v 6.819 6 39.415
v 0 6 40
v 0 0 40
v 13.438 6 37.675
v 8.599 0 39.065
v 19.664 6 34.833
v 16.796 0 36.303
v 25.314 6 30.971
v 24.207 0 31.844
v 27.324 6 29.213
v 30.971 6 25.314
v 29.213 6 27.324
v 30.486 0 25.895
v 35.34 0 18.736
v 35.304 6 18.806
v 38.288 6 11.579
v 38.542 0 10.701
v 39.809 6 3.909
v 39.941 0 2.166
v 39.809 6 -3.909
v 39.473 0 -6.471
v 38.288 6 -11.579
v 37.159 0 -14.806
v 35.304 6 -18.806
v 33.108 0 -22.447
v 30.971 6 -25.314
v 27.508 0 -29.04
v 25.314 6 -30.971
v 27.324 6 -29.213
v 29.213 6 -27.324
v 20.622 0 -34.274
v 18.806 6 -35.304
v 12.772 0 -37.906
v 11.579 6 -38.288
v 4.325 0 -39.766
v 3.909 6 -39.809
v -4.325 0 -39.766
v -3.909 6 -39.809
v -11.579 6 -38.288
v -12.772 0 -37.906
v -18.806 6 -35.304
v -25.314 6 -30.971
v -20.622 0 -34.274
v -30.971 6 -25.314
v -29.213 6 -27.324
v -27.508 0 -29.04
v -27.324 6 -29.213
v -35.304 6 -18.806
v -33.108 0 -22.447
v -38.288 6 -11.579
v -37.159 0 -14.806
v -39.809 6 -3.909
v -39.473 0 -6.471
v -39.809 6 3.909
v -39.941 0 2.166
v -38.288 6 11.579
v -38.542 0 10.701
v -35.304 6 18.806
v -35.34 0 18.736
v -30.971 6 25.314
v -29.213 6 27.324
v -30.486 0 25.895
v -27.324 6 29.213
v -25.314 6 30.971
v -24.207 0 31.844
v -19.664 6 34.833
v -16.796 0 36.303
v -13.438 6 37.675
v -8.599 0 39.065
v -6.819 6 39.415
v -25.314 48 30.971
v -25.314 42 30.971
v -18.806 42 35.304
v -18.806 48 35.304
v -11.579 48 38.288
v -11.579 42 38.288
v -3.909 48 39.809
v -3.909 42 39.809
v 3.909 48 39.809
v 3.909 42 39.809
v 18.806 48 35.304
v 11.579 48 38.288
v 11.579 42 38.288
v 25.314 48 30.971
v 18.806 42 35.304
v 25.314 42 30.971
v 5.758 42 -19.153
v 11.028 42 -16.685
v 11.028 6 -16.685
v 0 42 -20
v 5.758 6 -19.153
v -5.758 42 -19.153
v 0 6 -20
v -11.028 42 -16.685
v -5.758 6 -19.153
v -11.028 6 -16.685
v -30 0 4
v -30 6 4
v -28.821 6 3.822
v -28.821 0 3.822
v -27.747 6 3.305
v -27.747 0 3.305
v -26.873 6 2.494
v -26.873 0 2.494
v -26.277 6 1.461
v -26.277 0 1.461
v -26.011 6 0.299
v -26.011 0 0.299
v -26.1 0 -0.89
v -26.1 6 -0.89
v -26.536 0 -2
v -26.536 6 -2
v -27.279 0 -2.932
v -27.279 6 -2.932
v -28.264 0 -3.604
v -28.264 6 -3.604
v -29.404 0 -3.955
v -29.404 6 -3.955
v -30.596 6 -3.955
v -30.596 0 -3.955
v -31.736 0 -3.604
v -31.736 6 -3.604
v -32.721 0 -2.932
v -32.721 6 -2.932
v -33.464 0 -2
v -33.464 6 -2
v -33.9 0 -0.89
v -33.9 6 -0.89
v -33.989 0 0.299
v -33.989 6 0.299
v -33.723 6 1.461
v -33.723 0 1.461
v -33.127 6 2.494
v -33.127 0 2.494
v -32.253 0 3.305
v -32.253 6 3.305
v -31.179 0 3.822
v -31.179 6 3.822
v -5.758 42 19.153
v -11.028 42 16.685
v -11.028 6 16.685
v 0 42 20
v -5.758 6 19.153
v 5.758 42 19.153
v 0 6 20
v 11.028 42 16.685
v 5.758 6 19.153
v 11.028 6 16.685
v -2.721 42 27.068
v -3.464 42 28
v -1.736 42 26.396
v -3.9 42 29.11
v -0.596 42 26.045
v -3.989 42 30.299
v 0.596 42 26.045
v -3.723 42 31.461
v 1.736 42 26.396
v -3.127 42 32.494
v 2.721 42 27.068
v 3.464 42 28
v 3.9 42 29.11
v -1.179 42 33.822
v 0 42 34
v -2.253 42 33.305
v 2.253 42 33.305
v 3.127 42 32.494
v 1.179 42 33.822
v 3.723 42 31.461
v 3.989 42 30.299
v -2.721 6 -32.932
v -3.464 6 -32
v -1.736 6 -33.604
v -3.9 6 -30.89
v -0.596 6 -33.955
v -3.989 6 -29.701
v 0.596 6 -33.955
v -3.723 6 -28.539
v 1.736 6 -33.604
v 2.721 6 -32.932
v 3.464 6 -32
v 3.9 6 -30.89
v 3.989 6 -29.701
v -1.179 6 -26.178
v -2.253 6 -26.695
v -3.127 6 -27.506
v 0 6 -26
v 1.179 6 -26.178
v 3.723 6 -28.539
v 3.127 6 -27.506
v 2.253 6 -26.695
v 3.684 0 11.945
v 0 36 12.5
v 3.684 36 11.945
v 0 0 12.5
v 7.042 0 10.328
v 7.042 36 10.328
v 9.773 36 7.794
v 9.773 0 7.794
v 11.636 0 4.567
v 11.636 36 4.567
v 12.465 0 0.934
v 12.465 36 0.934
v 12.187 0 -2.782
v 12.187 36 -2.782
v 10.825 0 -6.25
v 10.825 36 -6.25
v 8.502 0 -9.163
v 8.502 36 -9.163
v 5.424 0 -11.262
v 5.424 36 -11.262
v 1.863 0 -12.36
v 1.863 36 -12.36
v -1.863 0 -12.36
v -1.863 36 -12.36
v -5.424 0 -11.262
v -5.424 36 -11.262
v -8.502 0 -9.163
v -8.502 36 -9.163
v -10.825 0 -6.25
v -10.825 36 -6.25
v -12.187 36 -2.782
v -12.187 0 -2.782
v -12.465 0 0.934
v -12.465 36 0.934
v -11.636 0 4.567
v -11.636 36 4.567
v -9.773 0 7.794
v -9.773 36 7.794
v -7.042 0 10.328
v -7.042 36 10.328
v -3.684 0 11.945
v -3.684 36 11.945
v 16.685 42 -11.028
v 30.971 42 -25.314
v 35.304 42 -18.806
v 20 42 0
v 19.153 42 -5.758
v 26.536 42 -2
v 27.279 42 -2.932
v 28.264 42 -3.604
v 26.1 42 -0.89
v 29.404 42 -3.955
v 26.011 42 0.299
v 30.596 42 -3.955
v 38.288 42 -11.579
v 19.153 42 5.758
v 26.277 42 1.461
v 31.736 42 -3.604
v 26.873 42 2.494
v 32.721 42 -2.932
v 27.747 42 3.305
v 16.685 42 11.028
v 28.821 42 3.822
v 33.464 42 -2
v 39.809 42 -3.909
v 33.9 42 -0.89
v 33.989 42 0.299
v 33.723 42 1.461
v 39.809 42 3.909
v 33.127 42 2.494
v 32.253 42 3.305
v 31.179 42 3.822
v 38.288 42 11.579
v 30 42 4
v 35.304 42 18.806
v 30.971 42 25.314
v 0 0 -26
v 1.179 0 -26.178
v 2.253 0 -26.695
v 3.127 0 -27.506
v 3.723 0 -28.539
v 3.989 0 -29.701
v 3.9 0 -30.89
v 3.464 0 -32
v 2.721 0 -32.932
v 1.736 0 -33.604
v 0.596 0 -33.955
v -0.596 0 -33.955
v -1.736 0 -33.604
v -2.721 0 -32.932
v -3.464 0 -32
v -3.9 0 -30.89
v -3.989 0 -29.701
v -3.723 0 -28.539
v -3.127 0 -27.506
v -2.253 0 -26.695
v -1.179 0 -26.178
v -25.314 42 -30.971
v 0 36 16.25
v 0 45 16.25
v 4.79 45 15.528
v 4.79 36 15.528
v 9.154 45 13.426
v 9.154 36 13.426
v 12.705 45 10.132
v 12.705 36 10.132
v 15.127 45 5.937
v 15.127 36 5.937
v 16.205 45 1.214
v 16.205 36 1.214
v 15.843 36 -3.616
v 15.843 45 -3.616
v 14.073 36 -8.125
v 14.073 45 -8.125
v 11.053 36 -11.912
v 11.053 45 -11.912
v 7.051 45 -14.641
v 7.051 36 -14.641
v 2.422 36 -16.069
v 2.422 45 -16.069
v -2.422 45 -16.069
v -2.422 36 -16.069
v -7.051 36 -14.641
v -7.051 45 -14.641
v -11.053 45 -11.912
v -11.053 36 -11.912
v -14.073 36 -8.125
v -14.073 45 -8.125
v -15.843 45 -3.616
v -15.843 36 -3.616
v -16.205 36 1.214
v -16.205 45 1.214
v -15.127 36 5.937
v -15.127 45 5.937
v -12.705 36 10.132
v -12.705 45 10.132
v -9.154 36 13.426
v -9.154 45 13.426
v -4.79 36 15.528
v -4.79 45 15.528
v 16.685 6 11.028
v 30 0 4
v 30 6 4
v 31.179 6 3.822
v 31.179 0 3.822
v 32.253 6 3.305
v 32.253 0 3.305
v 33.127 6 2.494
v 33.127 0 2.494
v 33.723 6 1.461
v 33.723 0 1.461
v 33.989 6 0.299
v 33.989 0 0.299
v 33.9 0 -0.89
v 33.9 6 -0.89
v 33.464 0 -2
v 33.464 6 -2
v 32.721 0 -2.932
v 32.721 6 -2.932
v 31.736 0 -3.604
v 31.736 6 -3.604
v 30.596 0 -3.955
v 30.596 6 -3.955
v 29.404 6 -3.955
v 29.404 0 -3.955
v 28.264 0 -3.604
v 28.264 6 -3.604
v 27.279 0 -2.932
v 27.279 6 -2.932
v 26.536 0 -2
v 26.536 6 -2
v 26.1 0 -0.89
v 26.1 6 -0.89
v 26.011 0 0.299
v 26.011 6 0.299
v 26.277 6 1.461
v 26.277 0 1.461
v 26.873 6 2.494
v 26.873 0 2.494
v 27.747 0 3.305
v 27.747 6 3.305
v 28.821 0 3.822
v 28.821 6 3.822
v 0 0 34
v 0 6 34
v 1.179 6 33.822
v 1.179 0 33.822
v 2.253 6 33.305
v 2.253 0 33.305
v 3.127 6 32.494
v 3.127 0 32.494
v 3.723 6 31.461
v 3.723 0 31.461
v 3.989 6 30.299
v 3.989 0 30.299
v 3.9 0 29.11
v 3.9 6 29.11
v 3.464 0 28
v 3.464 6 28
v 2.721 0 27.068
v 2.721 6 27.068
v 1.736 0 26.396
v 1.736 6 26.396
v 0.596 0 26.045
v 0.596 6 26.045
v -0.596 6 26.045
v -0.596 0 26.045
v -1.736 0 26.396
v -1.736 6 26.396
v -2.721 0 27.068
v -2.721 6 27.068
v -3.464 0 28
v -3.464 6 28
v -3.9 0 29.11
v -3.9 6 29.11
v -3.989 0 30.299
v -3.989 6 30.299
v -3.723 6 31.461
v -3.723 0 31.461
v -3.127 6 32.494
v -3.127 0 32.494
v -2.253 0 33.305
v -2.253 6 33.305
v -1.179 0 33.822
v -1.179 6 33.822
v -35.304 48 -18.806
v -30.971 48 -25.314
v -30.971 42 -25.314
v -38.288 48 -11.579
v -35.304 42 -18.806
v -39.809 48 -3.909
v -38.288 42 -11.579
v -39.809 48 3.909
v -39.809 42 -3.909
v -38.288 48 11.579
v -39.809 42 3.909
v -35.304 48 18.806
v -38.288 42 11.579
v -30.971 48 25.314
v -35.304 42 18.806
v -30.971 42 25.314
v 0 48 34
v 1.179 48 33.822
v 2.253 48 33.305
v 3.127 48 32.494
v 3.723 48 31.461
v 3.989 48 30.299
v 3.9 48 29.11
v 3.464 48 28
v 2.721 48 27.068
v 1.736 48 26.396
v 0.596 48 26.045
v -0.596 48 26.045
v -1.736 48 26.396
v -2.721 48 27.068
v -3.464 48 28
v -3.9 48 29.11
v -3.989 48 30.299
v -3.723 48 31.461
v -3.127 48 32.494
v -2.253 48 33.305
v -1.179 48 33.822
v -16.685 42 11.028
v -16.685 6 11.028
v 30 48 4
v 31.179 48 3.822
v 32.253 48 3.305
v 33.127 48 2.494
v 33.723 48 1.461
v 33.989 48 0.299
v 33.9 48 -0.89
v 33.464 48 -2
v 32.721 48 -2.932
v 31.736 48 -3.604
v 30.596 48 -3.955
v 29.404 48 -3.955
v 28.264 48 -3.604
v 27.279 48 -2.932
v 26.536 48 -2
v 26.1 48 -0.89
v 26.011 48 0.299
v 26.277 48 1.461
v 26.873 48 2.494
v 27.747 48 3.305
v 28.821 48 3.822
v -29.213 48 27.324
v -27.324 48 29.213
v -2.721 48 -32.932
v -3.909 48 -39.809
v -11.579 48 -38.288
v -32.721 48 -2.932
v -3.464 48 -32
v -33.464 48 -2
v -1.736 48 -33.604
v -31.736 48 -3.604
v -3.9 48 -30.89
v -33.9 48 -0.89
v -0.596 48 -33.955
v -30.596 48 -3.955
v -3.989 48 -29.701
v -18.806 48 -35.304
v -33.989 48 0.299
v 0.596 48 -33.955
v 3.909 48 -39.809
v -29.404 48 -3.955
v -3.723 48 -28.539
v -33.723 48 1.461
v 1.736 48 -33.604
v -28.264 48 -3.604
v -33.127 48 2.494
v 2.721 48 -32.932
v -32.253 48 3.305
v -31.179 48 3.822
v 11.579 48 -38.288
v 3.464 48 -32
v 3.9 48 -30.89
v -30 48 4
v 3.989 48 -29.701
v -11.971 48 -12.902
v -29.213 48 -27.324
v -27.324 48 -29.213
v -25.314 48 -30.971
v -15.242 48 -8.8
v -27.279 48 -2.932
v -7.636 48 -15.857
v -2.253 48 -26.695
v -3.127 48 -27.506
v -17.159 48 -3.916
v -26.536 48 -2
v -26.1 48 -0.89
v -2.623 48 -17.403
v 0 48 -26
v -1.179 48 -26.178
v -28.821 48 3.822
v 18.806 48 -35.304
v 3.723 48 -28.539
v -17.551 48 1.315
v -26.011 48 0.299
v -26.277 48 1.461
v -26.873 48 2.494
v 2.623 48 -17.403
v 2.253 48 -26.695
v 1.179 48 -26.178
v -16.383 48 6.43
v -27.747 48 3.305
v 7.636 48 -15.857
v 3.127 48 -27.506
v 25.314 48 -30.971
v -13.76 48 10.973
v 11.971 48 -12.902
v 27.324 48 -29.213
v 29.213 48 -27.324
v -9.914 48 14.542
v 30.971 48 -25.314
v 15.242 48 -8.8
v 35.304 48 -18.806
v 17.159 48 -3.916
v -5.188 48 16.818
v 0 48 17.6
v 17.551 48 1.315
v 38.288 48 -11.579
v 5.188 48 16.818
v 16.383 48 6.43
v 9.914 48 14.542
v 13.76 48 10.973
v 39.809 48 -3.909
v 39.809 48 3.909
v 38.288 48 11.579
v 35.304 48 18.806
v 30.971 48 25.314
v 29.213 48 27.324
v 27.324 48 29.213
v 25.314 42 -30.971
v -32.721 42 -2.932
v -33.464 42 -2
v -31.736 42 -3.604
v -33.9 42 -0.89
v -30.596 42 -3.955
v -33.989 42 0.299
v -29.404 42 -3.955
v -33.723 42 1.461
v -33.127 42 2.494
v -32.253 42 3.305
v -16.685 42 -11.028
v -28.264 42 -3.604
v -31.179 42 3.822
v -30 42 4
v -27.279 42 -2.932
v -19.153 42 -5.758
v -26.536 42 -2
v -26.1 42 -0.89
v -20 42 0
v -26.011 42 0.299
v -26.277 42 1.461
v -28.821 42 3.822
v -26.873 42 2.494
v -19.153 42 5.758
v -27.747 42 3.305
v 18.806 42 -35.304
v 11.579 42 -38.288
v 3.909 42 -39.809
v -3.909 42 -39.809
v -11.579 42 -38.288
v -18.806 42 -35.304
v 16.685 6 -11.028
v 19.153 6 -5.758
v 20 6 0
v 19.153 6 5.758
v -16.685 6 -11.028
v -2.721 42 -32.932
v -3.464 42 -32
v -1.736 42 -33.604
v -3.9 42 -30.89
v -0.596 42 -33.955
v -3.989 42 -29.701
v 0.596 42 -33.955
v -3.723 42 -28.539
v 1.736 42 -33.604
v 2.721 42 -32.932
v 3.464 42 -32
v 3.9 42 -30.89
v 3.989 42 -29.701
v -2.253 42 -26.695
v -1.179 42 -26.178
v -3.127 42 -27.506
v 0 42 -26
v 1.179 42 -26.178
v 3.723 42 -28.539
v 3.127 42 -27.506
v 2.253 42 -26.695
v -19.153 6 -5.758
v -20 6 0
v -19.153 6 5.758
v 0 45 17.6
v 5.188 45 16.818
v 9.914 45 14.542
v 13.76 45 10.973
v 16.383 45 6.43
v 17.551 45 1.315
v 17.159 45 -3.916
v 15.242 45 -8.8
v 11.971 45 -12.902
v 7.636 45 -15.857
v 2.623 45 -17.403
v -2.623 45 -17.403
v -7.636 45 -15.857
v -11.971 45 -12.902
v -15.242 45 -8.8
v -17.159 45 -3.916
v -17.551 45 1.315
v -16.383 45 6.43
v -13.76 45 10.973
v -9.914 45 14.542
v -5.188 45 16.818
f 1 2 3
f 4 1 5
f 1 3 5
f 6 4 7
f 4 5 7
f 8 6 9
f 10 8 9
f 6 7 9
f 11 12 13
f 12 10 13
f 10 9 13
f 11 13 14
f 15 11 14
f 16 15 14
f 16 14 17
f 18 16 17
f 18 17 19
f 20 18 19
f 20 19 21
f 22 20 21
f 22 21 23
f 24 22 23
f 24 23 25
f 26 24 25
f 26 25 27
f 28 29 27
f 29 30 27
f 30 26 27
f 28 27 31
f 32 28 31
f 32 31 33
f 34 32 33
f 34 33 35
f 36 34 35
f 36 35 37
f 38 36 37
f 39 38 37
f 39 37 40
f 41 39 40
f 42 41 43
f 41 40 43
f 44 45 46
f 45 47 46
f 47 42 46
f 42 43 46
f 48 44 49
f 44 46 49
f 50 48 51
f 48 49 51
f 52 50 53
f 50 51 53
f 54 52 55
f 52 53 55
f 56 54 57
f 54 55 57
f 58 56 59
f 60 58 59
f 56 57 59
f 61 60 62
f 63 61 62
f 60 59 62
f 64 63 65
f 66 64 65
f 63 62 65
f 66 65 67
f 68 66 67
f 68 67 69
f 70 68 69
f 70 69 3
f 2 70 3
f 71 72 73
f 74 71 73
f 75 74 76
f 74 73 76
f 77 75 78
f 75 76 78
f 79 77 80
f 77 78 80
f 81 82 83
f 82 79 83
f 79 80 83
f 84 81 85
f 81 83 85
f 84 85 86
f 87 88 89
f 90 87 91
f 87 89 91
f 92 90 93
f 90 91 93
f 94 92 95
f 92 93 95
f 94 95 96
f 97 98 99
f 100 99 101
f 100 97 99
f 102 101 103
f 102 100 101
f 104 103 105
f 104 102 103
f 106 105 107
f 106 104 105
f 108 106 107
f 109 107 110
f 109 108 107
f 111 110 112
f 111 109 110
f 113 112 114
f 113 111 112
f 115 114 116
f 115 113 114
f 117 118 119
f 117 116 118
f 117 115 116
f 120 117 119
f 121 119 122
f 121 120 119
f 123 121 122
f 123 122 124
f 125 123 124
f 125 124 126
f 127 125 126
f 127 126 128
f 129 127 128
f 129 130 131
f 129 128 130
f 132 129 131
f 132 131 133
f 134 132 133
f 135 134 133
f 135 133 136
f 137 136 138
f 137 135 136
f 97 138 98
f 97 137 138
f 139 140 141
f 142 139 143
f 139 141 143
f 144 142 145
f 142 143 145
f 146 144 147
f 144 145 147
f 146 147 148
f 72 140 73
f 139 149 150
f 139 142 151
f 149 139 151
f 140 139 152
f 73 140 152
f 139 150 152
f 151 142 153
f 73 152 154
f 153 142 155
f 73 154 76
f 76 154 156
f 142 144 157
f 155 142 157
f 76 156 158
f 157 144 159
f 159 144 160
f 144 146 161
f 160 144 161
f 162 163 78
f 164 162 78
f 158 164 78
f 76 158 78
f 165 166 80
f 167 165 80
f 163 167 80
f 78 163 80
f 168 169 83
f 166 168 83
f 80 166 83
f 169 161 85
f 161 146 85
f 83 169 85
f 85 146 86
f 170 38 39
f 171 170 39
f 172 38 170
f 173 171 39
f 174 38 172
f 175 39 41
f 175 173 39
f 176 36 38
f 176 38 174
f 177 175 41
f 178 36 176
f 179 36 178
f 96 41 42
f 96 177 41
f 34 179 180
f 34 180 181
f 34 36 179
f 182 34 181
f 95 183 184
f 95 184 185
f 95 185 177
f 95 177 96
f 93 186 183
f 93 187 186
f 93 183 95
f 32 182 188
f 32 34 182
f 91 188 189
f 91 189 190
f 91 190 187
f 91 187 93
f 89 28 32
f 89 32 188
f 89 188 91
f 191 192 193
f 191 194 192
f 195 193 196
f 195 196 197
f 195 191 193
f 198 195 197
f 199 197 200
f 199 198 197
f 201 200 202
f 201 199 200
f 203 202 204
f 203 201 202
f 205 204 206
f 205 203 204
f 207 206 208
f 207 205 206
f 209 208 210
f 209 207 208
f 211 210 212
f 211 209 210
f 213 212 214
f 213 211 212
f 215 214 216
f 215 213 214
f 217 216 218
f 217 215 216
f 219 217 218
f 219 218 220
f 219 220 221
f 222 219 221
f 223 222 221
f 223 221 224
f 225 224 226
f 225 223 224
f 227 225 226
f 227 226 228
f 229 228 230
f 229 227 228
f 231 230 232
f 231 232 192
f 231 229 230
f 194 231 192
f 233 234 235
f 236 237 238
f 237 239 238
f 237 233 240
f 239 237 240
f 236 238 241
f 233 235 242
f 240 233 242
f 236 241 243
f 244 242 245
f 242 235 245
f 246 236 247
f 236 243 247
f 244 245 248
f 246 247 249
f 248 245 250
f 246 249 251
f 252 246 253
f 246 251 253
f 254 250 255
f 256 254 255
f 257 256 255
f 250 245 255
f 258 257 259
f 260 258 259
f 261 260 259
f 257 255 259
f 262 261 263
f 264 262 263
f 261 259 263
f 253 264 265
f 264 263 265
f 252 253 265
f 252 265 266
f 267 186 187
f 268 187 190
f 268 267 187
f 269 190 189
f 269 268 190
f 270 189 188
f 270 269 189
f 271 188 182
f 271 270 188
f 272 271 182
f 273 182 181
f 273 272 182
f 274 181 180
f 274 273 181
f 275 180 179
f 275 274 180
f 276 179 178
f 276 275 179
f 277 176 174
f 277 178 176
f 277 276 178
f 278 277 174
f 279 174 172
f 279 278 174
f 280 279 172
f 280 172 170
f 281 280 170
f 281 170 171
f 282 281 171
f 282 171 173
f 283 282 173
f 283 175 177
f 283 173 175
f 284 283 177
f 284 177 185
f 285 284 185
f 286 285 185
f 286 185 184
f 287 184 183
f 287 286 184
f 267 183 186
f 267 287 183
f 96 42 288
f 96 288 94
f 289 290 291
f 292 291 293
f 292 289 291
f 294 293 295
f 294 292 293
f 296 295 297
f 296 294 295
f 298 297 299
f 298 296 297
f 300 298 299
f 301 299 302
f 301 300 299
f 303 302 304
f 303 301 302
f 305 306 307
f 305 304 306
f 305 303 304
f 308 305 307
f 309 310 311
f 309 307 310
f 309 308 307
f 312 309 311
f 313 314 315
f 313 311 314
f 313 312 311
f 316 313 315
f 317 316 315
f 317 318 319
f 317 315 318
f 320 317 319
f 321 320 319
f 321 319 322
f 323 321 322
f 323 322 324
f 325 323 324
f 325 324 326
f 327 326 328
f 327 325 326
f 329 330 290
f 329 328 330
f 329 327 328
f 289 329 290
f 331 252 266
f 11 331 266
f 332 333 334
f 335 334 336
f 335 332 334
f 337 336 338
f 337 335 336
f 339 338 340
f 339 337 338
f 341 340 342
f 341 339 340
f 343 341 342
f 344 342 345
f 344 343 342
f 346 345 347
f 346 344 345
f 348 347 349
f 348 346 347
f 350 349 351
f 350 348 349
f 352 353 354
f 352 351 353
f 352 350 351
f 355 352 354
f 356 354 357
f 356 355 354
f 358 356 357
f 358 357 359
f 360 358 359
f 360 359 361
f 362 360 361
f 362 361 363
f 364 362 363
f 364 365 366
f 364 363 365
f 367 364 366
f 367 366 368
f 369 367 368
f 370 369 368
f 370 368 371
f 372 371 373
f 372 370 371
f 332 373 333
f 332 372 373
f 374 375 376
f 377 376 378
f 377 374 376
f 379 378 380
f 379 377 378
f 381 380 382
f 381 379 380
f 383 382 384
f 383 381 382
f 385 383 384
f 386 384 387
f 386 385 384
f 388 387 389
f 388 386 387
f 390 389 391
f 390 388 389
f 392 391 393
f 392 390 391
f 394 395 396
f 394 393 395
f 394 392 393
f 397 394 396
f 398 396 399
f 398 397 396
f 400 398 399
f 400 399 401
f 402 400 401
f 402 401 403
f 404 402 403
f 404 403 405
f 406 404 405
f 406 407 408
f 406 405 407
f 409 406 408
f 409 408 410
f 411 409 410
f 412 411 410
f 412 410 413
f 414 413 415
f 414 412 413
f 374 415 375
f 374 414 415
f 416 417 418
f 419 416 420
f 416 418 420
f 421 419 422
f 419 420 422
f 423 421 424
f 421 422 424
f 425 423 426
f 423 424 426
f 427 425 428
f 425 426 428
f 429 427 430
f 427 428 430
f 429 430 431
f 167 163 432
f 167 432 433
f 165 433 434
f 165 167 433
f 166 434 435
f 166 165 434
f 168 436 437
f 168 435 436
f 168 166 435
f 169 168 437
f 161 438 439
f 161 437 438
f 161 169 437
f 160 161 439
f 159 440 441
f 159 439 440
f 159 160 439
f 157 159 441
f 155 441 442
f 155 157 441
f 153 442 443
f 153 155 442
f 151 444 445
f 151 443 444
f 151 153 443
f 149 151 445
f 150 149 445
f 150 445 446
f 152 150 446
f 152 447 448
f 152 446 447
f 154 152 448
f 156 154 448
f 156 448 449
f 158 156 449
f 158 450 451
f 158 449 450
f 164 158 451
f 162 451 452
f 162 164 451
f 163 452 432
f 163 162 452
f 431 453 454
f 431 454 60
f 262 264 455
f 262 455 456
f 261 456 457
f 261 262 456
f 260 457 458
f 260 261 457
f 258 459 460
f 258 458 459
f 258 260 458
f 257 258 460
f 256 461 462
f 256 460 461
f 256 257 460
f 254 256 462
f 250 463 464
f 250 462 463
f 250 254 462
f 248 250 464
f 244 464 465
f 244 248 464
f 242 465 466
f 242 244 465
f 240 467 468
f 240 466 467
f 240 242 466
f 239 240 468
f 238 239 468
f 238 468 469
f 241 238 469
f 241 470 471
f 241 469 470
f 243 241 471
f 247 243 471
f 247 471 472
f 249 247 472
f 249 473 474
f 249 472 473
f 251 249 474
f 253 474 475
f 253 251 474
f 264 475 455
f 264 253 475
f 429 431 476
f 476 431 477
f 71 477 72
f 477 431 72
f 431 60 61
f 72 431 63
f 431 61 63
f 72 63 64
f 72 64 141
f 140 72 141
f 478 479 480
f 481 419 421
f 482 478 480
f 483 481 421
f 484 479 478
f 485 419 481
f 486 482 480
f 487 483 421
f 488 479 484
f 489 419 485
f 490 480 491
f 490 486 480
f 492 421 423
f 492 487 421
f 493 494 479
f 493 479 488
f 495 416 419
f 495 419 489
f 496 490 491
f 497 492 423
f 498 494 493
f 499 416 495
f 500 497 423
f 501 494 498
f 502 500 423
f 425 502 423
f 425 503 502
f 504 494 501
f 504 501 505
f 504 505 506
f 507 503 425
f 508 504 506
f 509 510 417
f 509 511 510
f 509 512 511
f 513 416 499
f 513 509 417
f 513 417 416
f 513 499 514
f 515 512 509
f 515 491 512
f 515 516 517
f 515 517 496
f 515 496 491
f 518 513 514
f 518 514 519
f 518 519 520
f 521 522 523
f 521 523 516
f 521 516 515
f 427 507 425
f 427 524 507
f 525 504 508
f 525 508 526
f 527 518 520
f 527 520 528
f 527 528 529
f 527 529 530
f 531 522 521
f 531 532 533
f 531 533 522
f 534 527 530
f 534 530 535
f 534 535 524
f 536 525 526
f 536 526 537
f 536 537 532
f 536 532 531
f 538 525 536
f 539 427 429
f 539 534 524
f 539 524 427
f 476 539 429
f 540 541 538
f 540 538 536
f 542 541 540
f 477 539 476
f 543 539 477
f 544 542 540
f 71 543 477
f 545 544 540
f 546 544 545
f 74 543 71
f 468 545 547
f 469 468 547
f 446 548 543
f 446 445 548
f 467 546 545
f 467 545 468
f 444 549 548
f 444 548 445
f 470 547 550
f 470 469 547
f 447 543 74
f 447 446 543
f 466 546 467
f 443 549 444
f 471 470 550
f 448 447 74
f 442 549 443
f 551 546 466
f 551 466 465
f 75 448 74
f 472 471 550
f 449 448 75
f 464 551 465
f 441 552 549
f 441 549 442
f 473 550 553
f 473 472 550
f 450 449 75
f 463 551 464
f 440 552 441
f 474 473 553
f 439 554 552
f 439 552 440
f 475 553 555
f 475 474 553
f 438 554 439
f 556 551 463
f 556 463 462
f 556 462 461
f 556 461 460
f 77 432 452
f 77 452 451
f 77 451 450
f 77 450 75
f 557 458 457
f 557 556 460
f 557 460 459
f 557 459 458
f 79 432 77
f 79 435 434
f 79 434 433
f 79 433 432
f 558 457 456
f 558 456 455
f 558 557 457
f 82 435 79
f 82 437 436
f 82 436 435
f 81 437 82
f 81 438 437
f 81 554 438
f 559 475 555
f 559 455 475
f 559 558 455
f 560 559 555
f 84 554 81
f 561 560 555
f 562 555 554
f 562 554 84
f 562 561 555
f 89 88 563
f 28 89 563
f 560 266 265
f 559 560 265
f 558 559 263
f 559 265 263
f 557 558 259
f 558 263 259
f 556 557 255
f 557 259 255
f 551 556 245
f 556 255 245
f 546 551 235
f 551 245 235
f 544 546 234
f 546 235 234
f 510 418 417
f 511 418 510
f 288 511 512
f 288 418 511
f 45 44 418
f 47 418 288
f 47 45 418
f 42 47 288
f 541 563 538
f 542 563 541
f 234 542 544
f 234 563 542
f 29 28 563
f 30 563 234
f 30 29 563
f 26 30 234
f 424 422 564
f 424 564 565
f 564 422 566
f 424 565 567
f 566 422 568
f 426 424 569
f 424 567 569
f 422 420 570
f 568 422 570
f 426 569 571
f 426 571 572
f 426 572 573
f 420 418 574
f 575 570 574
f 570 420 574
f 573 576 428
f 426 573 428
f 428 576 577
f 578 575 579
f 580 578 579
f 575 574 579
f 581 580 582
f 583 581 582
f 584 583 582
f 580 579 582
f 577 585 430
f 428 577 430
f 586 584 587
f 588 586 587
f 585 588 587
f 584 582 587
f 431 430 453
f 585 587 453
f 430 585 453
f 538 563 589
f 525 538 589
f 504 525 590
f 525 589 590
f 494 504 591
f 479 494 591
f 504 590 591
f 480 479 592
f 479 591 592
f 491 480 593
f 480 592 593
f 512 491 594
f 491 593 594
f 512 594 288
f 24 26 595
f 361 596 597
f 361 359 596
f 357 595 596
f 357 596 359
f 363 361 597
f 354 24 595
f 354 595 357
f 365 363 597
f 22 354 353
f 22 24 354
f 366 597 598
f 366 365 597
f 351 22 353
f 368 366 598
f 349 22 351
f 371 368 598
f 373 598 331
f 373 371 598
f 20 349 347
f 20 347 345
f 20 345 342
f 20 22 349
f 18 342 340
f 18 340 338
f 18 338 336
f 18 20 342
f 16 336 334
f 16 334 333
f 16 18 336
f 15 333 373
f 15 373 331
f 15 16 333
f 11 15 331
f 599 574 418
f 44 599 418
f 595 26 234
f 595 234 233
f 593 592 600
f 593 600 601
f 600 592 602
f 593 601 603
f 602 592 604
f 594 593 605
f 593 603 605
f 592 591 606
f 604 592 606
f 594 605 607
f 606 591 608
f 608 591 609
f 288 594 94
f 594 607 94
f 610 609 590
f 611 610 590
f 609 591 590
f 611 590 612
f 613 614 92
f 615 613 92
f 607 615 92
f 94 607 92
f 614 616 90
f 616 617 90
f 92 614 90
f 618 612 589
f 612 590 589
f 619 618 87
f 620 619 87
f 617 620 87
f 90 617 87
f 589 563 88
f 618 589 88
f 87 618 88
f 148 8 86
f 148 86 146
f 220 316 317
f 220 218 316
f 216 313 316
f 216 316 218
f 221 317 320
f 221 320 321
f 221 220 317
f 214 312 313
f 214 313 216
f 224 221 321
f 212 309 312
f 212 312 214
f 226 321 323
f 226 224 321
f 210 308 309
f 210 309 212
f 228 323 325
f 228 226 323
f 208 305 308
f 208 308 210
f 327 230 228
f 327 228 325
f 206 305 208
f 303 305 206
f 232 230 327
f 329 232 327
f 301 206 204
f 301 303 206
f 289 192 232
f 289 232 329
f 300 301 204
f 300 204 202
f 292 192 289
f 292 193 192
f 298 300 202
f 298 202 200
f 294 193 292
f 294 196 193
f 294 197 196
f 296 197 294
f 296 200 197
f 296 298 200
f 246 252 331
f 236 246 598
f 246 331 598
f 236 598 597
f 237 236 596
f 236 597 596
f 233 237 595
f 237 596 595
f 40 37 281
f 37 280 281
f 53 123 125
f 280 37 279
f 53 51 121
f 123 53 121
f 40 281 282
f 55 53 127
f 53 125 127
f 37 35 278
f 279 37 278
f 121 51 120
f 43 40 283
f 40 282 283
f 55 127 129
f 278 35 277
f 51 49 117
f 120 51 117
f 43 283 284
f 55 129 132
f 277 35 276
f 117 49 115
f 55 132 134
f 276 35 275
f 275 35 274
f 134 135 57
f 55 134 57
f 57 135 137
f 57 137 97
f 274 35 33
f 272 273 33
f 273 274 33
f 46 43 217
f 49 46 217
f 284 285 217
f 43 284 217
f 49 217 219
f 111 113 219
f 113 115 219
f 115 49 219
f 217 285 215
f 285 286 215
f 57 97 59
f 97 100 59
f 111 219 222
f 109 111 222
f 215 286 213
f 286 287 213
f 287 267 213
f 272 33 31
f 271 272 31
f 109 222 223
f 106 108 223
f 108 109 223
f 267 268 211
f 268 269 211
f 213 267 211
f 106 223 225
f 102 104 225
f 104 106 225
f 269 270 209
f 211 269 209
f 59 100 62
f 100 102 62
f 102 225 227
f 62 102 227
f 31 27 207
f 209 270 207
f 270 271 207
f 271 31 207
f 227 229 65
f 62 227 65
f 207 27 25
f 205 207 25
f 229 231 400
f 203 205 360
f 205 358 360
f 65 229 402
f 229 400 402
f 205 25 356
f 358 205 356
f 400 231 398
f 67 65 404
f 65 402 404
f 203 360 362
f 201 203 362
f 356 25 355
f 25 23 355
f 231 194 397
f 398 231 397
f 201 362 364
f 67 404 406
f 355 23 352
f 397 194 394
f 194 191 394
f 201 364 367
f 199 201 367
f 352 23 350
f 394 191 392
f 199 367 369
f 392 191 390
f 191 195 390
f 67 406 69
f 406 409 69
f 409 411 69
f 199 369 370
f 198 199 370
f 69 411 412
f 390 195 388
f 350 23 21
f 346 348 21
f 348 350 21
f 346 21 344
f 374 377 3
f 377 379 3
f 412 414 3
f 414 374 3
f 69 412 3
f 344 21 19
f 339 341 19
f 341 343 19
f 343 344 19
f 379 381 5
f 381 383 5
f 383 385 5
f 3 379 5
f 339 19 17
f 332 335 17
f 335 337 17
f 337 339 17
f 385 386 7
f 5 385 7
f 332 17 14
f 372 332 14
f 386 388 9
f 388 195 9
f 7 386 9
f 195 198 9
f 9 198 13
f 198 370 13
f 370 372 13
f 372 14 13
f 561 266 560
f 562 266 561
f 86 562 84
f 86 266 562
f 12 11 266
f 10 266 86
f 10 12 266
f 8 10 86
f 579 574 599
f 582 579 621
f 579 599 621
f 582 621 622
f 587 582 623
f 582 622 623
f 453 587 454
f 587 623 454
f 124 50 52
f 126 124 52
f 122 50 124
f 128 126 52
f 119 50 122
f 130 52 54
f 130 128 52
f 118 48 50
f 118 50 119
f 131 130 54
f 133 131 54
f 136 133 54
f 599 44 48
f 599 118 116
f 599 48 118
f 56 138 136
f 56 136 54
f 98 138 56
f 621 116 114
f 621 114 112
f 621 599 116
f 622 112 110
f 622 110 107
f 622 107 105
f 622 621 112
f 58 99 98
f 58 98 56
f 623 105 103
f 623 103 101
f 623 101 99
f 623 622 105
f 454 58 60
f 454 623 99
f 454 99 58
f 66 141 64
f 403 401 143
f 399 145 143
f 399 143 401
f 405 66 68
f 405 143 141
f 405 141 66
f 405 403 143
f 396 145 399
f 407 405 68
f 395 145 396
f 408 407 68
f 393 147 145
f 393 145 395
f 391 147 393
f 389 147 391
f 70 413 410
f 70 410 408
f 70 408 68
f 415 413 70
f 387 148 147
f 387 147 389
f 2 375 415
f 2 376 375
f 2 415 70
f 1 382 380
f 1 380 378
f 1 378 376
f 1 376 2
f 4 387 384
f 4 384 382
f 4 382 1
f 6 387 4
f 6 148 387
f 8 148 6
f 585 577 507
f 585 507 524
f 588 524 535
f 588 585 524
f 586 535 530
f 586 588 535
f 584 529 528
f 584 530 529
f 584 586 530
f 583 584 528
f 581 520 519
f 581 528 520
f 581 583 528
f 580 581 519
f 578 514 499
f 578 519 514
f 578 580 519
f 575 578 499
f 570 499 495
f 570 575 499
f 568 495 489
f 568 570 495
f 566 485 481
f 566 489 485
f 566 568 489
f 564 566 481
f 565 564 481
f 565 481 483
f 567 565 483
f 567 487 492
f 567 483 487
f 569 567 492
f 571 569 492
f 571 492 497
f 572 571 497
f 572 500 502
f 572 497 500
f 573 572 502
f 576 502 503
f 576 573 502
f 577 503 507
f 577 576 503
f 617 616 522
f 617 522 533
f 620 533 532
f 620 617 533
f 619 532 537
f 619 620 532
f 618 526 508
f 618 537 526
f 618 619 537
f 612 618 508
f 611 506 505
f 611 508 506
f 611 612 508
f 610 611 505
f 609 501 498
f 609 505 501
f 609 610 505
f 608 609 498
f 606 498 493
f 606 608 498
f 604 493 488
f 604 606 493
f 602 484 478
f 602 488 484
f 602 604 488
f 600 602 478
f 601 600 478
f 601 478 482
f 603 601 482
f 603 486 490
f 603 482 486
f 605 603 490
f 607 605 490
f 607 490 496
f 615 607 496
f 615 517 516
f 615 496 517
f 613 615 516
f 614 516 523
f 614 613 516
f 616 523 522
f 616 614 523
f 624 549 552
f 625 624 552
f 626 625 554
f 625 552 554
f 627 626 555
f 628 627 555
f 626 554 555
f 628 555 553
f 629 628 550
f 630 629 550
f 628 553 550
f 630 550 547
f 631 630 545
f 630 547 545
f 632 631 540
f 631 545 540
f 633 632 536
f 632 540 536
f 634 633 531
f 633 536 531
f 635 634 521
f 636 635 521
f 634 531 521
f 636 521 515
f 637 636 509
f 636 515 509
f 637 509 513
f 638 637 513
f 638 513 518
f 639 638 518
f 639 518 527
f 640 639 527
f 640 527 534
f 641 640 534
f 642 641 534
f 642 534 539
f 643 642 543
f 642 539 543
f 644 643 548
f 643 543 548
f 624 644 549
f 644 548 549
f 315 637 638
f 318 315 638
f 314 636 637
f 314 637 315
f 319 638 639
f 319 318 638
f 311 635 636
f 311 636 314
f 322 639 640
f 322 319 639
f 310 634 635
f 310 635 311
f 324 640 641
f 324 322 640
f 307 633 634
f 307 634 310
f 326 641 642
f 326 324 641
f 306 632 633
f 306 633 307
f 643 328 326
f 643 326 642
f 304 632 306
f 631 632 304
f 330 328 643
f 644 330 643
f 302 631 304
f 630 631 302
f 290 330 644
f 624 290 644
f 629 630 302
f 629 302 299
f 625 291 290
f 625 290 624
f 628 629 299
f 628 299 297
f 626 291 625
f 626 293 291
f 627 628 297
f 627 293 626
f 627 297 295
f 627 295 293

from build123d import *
from build123d.topology import SkipClean

# Parameters (mm, degrees)
SKETCH1_R           = 40
SKETCH1_R_2         = 12.5
BOSS_EXTRUDE1_DEPTH = 6
SKETCH3_R           = 20
SKETCH3_R_2         = 12.5
BOSS_EXTRUDE2_DEPTH = 30
SKETCH4_R           = 20
SKETCH4_R_2         = 16.25
BOSS_EXTRUDE3_DEPTH = 12
BOSS_EXTRUDE4_DEPTH = 42
SKETCH6_R           = 17.6
CUT_EXTRUDE2_DEPTH  = 3
BOSS_EXTRUDE5_START = -6
SKETCH7_R           = 40
SKETCH7_R_2         = 20
BOSS_EXTRUDE5_DEPTH = 6
CUT_EXTRUDE1_REACH  = 76.189
SKETCH2_R           = 4


with BuildPart() as part:
    # Sketch1 → Boss-Extrude1 (new body)
    with BuildSketch(Plane(origin=(0, 0, 0), x_dir=(1, 0, 0), z_dir=(0, 1, 0))):
        with Locations(Location((0, 0, 0), (0, 0, 270))):
            Circle(SKETCH1_R)
        with Locations(Location((0, 0, 0), (0, 0, 270))):
            Circle(SKETCH1_R_2, mode=Mode.SUBTRACT)
    extrude(amount=BOSS_EXTRUDE1_DEPTH)

    # Sketch3 → Boss-Extrude2 (add)
    with BuildSketch(Plane(origin=(0, 6, 0), x_dir=(1, 0, 0), z_dir=(0, 1, 0))):
        with Locations(Location((0, 0, 0), (0, 0, 270))):
            Circle(SKETCH3_R)
        with Locations(Location((0, 0, 0), (0, 0, 270))):
            Circle(SKETCH3_R_2, mode=Mode.SUBTRACT)
    extrude(amount=BOSS_EXTRUDE2_DEPTH)

    # Sketch4 → Boss-Extrude3 (add)
    with BuildSketch(Plane(origin=(0, 36, 0), x_dir=(1, 0, 0), z_dir=(0, 1, 0))):
        with Locations(Location((0, 0, 0), (0, 0, 270))):
            Circle(SKETCH4_R)
        with Locations(Location((0, 0, 0), (0, 0, 270))):
            Circle(SKETCH4_R_2, mode=Mode.SUBTRACT)
    extrude(amount=BOSS_EXTRUDE3_DEPTH)

    # Sketch5 → Boss-Extrude4 (add)
    with SkipClean():  # the faces are left unmerged after this step: merging them gives an invalid solid
        with BuildSketch(Plane(origin=(0, 6, 0), x_dir=(1, 0, 0), z_dir=(0, 1, 0))):
            with BuildLine():
                Line((-16.684833585, -11.027979336), (-30.970921684, -25.314067434))
                ThreePointArc((-30.970921684, -25.314067434), (-28.284271247, -28.284271247), (-25.314067434, -30.970921684))
                Line((-25.314067434, -30.970921684), (-11.027979336, -16.684833585))
                ThreePointArc((-11.027979336, -16.684833585), (-14.142135624, -14.142135624), (-16.684833585, -11.027979336))
            make_face()
            with BuildLine():
                Line((-16.684833585, 11.027979336), (-30.970921684, 25.314067434))
                ThreePointArc((-30.970921684, 25.314067434), (-28.284271247, 28.284271247), (-25.314067434, 30.970921684))
                Line((-25.314067434, 30.970921684), (-11.027979336, 16.684833585))
                ThreePointArc((-11.027979336, 16.684833585), (-14.142135624, 14.142135624), (-16.684833585, 11.027979336))
            make_face()
            with BuildLine():
                Line((11.027979336, 16.684833585), (25.314067434, 30.970921684))
                ThreePointArc((25.314067434, 30.970921684), (28.284271247, 28.284271247), (30.970921684, 25.314067434))
                Line((30.970921684, 25.314067434), (16.684833585, 11.027979336))
                ThreePointArc((16.684833585, 11.027979336), (14.142135624, 14.142135624), (11.027979336, 16.684833585))
            make_face()
            with BuildLine():
                Line((16.684833585, -11.027979336), (30.970921684, -25.314067434))
                ThreePointArc((30.970921684, -25.314067434), (28.284271247, -28.284271247), (25.314067434, -30.970921684))
                Line((25.314067434, -30.970921684), (11.027979336, -16.684833585))
                ThreePointArc((11.027979336, -16.684833585), (14.142135624, -14.142135624), (16.684833585, -11.027979336))
            make_face()
        extrude(amount=BOSS_EXTRUDE4_DEPTH)

    # Sketch6 → Cut-Extrude2 (cut)
    with SkipClean():  # the faces are left unmerged after this step: merging them gives an invalid solid
        with BuildSketch(Plane(origin=(0, 48, 0), x_dir=(1, 0, 0), z_dir=(0, 1, 0))):
            with Locations(Location((0, 0, 0), (0, 0, 270))):
                Circle(SKETCH6_R)
        extrude(amount=-CUT_EXTRUDE2_DEPTH, mode=Mode.SUBTRACT)

    # Sketch7 → Boss-Extrude5 (add)
    with SkipClean():  # the faces are left unmerged after this step: merging them gives an invalid solid
        with BuildSketch(Plane(origin=(0, 48, 0), x_dir=(1, 0, 0), z_dir=(0, 1, 0)).offset(BOSS_EXTRUDE5_START)):
            with Locations(Location((0, 0, 0), (0, 0, 270))):
                Circle(SKETCH7_R)
            Circle(SKETCH7_R_2, mode=Mode.SUBTRACT)
        extrude(amount=BOSS_EXTRUDE5_DEPTH)

    # Cut-Extrude1: up to this face of the body (flat: up to its plane)
    cut_extrude1_end = Plane(part.part.faces().sort_by_distance((0, 48, 29.129034722))[0])
    # Sketch2 → Cut-Extrude1 (cut, up to the picked face)
    with BuildSketch(Plane(origin=(0, 0, 0), x_dir=(1, 0, 0), z_dir=(0, 1, 0)), mode=Mode.PRIVATE) as cut_extrude1_sk1:
        with Locations(Location((0, 30, 0), (0, 0, 270))):
            Circle(SKETCH2_R)
    cut_extrude1_tool1 = split(extrude(cut_extrude1_sk1.sketch, amount=CUT_EXTRUDE1_REACH, mode=Mode.PRIVATE), bisect_by=cut_extrude1_end, keep=Keep.BOTH, mode=Mode.PRIVATE)
    # Sketch2 → Cut-Extrude1 (cut, up to the picked face)
    with BuildSketch(Plane(origin=(0, 0, 0), x_dir=(1, 0, 0), z_dir=(0, 1, 0)), mode=Mode.PRIVATE) as cut_extrude1_sk2:
        with Locations(Location((30, 0, 0), (0, 0, 270))):
            Circle(SKETCH2_R)
    cut_extrude1_tool2 = split(extrude(cut_extrude1_sk2.sketch, amount=CUT_EXTRUDE1_REACH, mode=Mode.PRIVATE), bisect_by=cut_extrude1_end, keep=Keep.BOTH, mode=Mode.PRIVATE)
    # Sketch2 → Cut-Extrude1 (cut, up to the picked face)
    with BuildSketch(Plane(origin=(0, 0, 0), x_dir=(1, 0, 0), z_dir=(0, 1, 0)), mode=Mode.PRIVATE) as cut_extrude1_sk3:
        with Locations(Location((0, -30, 0), (0, 0, 270))):
            Circle(SKETCH2_R)
    cut_extrude1_tool3 = split(extrude(cut_extrude1_sk3.sketch, amount=CUT_EXTRUDE1_REACH, mode=Mode.PRIVATE), bisect_by=cut_extrude1_end, keep=Keep.BOTH, mode=Mode.PRIVATE)
    # Sketch2 → Cut-Extrude1 (cut, up to the picked face)
    with BuildSketch(Plane(origin=(0, 0, 0), x_dir=(1, 0, 0), z_dir=(0, 1, 0)), mode=Mode.PRIVATE) as cut_extrude1_sk4:
        with Locations(Location((-30, 0, 0), (0, 0, 270))):
            Circle(SKETCH2_R)
    cut_extrude1_tool4 = split(extrude(cut_extrude1_sk4.sketch, amount=CUT_EXTRUDE1_REACH, mode=Mode.PRIVATE), bisect_by=cut_extrude1_end, keep=Keep.BOTH, mode=Mode.PRIVATE)
    add(cut_extrude1_tool1.solids().sort_by(Axis((0, 0, -30), (0, 1, 0)))[0], mode=Mode.SUBTRACT)
    add(cut_extrude1_tool2.solids().sort_by(Axis((30, 0, 0), (0, 1, 0)))[0], mode=Mode.SUBTRACT)
    add(cut_extrude1_tool3.solids().sort_by(Axis((0, 0, 30), (0, 1, 0)))[0], mode=Mode.SUBTRACT)
    add(cut_extrude1_tool4.solids().sort_by(Axis((-30, 0, 0), (0, 1, 0)))[0], mode=Mode.SUBTRACT)


solid = part.part
